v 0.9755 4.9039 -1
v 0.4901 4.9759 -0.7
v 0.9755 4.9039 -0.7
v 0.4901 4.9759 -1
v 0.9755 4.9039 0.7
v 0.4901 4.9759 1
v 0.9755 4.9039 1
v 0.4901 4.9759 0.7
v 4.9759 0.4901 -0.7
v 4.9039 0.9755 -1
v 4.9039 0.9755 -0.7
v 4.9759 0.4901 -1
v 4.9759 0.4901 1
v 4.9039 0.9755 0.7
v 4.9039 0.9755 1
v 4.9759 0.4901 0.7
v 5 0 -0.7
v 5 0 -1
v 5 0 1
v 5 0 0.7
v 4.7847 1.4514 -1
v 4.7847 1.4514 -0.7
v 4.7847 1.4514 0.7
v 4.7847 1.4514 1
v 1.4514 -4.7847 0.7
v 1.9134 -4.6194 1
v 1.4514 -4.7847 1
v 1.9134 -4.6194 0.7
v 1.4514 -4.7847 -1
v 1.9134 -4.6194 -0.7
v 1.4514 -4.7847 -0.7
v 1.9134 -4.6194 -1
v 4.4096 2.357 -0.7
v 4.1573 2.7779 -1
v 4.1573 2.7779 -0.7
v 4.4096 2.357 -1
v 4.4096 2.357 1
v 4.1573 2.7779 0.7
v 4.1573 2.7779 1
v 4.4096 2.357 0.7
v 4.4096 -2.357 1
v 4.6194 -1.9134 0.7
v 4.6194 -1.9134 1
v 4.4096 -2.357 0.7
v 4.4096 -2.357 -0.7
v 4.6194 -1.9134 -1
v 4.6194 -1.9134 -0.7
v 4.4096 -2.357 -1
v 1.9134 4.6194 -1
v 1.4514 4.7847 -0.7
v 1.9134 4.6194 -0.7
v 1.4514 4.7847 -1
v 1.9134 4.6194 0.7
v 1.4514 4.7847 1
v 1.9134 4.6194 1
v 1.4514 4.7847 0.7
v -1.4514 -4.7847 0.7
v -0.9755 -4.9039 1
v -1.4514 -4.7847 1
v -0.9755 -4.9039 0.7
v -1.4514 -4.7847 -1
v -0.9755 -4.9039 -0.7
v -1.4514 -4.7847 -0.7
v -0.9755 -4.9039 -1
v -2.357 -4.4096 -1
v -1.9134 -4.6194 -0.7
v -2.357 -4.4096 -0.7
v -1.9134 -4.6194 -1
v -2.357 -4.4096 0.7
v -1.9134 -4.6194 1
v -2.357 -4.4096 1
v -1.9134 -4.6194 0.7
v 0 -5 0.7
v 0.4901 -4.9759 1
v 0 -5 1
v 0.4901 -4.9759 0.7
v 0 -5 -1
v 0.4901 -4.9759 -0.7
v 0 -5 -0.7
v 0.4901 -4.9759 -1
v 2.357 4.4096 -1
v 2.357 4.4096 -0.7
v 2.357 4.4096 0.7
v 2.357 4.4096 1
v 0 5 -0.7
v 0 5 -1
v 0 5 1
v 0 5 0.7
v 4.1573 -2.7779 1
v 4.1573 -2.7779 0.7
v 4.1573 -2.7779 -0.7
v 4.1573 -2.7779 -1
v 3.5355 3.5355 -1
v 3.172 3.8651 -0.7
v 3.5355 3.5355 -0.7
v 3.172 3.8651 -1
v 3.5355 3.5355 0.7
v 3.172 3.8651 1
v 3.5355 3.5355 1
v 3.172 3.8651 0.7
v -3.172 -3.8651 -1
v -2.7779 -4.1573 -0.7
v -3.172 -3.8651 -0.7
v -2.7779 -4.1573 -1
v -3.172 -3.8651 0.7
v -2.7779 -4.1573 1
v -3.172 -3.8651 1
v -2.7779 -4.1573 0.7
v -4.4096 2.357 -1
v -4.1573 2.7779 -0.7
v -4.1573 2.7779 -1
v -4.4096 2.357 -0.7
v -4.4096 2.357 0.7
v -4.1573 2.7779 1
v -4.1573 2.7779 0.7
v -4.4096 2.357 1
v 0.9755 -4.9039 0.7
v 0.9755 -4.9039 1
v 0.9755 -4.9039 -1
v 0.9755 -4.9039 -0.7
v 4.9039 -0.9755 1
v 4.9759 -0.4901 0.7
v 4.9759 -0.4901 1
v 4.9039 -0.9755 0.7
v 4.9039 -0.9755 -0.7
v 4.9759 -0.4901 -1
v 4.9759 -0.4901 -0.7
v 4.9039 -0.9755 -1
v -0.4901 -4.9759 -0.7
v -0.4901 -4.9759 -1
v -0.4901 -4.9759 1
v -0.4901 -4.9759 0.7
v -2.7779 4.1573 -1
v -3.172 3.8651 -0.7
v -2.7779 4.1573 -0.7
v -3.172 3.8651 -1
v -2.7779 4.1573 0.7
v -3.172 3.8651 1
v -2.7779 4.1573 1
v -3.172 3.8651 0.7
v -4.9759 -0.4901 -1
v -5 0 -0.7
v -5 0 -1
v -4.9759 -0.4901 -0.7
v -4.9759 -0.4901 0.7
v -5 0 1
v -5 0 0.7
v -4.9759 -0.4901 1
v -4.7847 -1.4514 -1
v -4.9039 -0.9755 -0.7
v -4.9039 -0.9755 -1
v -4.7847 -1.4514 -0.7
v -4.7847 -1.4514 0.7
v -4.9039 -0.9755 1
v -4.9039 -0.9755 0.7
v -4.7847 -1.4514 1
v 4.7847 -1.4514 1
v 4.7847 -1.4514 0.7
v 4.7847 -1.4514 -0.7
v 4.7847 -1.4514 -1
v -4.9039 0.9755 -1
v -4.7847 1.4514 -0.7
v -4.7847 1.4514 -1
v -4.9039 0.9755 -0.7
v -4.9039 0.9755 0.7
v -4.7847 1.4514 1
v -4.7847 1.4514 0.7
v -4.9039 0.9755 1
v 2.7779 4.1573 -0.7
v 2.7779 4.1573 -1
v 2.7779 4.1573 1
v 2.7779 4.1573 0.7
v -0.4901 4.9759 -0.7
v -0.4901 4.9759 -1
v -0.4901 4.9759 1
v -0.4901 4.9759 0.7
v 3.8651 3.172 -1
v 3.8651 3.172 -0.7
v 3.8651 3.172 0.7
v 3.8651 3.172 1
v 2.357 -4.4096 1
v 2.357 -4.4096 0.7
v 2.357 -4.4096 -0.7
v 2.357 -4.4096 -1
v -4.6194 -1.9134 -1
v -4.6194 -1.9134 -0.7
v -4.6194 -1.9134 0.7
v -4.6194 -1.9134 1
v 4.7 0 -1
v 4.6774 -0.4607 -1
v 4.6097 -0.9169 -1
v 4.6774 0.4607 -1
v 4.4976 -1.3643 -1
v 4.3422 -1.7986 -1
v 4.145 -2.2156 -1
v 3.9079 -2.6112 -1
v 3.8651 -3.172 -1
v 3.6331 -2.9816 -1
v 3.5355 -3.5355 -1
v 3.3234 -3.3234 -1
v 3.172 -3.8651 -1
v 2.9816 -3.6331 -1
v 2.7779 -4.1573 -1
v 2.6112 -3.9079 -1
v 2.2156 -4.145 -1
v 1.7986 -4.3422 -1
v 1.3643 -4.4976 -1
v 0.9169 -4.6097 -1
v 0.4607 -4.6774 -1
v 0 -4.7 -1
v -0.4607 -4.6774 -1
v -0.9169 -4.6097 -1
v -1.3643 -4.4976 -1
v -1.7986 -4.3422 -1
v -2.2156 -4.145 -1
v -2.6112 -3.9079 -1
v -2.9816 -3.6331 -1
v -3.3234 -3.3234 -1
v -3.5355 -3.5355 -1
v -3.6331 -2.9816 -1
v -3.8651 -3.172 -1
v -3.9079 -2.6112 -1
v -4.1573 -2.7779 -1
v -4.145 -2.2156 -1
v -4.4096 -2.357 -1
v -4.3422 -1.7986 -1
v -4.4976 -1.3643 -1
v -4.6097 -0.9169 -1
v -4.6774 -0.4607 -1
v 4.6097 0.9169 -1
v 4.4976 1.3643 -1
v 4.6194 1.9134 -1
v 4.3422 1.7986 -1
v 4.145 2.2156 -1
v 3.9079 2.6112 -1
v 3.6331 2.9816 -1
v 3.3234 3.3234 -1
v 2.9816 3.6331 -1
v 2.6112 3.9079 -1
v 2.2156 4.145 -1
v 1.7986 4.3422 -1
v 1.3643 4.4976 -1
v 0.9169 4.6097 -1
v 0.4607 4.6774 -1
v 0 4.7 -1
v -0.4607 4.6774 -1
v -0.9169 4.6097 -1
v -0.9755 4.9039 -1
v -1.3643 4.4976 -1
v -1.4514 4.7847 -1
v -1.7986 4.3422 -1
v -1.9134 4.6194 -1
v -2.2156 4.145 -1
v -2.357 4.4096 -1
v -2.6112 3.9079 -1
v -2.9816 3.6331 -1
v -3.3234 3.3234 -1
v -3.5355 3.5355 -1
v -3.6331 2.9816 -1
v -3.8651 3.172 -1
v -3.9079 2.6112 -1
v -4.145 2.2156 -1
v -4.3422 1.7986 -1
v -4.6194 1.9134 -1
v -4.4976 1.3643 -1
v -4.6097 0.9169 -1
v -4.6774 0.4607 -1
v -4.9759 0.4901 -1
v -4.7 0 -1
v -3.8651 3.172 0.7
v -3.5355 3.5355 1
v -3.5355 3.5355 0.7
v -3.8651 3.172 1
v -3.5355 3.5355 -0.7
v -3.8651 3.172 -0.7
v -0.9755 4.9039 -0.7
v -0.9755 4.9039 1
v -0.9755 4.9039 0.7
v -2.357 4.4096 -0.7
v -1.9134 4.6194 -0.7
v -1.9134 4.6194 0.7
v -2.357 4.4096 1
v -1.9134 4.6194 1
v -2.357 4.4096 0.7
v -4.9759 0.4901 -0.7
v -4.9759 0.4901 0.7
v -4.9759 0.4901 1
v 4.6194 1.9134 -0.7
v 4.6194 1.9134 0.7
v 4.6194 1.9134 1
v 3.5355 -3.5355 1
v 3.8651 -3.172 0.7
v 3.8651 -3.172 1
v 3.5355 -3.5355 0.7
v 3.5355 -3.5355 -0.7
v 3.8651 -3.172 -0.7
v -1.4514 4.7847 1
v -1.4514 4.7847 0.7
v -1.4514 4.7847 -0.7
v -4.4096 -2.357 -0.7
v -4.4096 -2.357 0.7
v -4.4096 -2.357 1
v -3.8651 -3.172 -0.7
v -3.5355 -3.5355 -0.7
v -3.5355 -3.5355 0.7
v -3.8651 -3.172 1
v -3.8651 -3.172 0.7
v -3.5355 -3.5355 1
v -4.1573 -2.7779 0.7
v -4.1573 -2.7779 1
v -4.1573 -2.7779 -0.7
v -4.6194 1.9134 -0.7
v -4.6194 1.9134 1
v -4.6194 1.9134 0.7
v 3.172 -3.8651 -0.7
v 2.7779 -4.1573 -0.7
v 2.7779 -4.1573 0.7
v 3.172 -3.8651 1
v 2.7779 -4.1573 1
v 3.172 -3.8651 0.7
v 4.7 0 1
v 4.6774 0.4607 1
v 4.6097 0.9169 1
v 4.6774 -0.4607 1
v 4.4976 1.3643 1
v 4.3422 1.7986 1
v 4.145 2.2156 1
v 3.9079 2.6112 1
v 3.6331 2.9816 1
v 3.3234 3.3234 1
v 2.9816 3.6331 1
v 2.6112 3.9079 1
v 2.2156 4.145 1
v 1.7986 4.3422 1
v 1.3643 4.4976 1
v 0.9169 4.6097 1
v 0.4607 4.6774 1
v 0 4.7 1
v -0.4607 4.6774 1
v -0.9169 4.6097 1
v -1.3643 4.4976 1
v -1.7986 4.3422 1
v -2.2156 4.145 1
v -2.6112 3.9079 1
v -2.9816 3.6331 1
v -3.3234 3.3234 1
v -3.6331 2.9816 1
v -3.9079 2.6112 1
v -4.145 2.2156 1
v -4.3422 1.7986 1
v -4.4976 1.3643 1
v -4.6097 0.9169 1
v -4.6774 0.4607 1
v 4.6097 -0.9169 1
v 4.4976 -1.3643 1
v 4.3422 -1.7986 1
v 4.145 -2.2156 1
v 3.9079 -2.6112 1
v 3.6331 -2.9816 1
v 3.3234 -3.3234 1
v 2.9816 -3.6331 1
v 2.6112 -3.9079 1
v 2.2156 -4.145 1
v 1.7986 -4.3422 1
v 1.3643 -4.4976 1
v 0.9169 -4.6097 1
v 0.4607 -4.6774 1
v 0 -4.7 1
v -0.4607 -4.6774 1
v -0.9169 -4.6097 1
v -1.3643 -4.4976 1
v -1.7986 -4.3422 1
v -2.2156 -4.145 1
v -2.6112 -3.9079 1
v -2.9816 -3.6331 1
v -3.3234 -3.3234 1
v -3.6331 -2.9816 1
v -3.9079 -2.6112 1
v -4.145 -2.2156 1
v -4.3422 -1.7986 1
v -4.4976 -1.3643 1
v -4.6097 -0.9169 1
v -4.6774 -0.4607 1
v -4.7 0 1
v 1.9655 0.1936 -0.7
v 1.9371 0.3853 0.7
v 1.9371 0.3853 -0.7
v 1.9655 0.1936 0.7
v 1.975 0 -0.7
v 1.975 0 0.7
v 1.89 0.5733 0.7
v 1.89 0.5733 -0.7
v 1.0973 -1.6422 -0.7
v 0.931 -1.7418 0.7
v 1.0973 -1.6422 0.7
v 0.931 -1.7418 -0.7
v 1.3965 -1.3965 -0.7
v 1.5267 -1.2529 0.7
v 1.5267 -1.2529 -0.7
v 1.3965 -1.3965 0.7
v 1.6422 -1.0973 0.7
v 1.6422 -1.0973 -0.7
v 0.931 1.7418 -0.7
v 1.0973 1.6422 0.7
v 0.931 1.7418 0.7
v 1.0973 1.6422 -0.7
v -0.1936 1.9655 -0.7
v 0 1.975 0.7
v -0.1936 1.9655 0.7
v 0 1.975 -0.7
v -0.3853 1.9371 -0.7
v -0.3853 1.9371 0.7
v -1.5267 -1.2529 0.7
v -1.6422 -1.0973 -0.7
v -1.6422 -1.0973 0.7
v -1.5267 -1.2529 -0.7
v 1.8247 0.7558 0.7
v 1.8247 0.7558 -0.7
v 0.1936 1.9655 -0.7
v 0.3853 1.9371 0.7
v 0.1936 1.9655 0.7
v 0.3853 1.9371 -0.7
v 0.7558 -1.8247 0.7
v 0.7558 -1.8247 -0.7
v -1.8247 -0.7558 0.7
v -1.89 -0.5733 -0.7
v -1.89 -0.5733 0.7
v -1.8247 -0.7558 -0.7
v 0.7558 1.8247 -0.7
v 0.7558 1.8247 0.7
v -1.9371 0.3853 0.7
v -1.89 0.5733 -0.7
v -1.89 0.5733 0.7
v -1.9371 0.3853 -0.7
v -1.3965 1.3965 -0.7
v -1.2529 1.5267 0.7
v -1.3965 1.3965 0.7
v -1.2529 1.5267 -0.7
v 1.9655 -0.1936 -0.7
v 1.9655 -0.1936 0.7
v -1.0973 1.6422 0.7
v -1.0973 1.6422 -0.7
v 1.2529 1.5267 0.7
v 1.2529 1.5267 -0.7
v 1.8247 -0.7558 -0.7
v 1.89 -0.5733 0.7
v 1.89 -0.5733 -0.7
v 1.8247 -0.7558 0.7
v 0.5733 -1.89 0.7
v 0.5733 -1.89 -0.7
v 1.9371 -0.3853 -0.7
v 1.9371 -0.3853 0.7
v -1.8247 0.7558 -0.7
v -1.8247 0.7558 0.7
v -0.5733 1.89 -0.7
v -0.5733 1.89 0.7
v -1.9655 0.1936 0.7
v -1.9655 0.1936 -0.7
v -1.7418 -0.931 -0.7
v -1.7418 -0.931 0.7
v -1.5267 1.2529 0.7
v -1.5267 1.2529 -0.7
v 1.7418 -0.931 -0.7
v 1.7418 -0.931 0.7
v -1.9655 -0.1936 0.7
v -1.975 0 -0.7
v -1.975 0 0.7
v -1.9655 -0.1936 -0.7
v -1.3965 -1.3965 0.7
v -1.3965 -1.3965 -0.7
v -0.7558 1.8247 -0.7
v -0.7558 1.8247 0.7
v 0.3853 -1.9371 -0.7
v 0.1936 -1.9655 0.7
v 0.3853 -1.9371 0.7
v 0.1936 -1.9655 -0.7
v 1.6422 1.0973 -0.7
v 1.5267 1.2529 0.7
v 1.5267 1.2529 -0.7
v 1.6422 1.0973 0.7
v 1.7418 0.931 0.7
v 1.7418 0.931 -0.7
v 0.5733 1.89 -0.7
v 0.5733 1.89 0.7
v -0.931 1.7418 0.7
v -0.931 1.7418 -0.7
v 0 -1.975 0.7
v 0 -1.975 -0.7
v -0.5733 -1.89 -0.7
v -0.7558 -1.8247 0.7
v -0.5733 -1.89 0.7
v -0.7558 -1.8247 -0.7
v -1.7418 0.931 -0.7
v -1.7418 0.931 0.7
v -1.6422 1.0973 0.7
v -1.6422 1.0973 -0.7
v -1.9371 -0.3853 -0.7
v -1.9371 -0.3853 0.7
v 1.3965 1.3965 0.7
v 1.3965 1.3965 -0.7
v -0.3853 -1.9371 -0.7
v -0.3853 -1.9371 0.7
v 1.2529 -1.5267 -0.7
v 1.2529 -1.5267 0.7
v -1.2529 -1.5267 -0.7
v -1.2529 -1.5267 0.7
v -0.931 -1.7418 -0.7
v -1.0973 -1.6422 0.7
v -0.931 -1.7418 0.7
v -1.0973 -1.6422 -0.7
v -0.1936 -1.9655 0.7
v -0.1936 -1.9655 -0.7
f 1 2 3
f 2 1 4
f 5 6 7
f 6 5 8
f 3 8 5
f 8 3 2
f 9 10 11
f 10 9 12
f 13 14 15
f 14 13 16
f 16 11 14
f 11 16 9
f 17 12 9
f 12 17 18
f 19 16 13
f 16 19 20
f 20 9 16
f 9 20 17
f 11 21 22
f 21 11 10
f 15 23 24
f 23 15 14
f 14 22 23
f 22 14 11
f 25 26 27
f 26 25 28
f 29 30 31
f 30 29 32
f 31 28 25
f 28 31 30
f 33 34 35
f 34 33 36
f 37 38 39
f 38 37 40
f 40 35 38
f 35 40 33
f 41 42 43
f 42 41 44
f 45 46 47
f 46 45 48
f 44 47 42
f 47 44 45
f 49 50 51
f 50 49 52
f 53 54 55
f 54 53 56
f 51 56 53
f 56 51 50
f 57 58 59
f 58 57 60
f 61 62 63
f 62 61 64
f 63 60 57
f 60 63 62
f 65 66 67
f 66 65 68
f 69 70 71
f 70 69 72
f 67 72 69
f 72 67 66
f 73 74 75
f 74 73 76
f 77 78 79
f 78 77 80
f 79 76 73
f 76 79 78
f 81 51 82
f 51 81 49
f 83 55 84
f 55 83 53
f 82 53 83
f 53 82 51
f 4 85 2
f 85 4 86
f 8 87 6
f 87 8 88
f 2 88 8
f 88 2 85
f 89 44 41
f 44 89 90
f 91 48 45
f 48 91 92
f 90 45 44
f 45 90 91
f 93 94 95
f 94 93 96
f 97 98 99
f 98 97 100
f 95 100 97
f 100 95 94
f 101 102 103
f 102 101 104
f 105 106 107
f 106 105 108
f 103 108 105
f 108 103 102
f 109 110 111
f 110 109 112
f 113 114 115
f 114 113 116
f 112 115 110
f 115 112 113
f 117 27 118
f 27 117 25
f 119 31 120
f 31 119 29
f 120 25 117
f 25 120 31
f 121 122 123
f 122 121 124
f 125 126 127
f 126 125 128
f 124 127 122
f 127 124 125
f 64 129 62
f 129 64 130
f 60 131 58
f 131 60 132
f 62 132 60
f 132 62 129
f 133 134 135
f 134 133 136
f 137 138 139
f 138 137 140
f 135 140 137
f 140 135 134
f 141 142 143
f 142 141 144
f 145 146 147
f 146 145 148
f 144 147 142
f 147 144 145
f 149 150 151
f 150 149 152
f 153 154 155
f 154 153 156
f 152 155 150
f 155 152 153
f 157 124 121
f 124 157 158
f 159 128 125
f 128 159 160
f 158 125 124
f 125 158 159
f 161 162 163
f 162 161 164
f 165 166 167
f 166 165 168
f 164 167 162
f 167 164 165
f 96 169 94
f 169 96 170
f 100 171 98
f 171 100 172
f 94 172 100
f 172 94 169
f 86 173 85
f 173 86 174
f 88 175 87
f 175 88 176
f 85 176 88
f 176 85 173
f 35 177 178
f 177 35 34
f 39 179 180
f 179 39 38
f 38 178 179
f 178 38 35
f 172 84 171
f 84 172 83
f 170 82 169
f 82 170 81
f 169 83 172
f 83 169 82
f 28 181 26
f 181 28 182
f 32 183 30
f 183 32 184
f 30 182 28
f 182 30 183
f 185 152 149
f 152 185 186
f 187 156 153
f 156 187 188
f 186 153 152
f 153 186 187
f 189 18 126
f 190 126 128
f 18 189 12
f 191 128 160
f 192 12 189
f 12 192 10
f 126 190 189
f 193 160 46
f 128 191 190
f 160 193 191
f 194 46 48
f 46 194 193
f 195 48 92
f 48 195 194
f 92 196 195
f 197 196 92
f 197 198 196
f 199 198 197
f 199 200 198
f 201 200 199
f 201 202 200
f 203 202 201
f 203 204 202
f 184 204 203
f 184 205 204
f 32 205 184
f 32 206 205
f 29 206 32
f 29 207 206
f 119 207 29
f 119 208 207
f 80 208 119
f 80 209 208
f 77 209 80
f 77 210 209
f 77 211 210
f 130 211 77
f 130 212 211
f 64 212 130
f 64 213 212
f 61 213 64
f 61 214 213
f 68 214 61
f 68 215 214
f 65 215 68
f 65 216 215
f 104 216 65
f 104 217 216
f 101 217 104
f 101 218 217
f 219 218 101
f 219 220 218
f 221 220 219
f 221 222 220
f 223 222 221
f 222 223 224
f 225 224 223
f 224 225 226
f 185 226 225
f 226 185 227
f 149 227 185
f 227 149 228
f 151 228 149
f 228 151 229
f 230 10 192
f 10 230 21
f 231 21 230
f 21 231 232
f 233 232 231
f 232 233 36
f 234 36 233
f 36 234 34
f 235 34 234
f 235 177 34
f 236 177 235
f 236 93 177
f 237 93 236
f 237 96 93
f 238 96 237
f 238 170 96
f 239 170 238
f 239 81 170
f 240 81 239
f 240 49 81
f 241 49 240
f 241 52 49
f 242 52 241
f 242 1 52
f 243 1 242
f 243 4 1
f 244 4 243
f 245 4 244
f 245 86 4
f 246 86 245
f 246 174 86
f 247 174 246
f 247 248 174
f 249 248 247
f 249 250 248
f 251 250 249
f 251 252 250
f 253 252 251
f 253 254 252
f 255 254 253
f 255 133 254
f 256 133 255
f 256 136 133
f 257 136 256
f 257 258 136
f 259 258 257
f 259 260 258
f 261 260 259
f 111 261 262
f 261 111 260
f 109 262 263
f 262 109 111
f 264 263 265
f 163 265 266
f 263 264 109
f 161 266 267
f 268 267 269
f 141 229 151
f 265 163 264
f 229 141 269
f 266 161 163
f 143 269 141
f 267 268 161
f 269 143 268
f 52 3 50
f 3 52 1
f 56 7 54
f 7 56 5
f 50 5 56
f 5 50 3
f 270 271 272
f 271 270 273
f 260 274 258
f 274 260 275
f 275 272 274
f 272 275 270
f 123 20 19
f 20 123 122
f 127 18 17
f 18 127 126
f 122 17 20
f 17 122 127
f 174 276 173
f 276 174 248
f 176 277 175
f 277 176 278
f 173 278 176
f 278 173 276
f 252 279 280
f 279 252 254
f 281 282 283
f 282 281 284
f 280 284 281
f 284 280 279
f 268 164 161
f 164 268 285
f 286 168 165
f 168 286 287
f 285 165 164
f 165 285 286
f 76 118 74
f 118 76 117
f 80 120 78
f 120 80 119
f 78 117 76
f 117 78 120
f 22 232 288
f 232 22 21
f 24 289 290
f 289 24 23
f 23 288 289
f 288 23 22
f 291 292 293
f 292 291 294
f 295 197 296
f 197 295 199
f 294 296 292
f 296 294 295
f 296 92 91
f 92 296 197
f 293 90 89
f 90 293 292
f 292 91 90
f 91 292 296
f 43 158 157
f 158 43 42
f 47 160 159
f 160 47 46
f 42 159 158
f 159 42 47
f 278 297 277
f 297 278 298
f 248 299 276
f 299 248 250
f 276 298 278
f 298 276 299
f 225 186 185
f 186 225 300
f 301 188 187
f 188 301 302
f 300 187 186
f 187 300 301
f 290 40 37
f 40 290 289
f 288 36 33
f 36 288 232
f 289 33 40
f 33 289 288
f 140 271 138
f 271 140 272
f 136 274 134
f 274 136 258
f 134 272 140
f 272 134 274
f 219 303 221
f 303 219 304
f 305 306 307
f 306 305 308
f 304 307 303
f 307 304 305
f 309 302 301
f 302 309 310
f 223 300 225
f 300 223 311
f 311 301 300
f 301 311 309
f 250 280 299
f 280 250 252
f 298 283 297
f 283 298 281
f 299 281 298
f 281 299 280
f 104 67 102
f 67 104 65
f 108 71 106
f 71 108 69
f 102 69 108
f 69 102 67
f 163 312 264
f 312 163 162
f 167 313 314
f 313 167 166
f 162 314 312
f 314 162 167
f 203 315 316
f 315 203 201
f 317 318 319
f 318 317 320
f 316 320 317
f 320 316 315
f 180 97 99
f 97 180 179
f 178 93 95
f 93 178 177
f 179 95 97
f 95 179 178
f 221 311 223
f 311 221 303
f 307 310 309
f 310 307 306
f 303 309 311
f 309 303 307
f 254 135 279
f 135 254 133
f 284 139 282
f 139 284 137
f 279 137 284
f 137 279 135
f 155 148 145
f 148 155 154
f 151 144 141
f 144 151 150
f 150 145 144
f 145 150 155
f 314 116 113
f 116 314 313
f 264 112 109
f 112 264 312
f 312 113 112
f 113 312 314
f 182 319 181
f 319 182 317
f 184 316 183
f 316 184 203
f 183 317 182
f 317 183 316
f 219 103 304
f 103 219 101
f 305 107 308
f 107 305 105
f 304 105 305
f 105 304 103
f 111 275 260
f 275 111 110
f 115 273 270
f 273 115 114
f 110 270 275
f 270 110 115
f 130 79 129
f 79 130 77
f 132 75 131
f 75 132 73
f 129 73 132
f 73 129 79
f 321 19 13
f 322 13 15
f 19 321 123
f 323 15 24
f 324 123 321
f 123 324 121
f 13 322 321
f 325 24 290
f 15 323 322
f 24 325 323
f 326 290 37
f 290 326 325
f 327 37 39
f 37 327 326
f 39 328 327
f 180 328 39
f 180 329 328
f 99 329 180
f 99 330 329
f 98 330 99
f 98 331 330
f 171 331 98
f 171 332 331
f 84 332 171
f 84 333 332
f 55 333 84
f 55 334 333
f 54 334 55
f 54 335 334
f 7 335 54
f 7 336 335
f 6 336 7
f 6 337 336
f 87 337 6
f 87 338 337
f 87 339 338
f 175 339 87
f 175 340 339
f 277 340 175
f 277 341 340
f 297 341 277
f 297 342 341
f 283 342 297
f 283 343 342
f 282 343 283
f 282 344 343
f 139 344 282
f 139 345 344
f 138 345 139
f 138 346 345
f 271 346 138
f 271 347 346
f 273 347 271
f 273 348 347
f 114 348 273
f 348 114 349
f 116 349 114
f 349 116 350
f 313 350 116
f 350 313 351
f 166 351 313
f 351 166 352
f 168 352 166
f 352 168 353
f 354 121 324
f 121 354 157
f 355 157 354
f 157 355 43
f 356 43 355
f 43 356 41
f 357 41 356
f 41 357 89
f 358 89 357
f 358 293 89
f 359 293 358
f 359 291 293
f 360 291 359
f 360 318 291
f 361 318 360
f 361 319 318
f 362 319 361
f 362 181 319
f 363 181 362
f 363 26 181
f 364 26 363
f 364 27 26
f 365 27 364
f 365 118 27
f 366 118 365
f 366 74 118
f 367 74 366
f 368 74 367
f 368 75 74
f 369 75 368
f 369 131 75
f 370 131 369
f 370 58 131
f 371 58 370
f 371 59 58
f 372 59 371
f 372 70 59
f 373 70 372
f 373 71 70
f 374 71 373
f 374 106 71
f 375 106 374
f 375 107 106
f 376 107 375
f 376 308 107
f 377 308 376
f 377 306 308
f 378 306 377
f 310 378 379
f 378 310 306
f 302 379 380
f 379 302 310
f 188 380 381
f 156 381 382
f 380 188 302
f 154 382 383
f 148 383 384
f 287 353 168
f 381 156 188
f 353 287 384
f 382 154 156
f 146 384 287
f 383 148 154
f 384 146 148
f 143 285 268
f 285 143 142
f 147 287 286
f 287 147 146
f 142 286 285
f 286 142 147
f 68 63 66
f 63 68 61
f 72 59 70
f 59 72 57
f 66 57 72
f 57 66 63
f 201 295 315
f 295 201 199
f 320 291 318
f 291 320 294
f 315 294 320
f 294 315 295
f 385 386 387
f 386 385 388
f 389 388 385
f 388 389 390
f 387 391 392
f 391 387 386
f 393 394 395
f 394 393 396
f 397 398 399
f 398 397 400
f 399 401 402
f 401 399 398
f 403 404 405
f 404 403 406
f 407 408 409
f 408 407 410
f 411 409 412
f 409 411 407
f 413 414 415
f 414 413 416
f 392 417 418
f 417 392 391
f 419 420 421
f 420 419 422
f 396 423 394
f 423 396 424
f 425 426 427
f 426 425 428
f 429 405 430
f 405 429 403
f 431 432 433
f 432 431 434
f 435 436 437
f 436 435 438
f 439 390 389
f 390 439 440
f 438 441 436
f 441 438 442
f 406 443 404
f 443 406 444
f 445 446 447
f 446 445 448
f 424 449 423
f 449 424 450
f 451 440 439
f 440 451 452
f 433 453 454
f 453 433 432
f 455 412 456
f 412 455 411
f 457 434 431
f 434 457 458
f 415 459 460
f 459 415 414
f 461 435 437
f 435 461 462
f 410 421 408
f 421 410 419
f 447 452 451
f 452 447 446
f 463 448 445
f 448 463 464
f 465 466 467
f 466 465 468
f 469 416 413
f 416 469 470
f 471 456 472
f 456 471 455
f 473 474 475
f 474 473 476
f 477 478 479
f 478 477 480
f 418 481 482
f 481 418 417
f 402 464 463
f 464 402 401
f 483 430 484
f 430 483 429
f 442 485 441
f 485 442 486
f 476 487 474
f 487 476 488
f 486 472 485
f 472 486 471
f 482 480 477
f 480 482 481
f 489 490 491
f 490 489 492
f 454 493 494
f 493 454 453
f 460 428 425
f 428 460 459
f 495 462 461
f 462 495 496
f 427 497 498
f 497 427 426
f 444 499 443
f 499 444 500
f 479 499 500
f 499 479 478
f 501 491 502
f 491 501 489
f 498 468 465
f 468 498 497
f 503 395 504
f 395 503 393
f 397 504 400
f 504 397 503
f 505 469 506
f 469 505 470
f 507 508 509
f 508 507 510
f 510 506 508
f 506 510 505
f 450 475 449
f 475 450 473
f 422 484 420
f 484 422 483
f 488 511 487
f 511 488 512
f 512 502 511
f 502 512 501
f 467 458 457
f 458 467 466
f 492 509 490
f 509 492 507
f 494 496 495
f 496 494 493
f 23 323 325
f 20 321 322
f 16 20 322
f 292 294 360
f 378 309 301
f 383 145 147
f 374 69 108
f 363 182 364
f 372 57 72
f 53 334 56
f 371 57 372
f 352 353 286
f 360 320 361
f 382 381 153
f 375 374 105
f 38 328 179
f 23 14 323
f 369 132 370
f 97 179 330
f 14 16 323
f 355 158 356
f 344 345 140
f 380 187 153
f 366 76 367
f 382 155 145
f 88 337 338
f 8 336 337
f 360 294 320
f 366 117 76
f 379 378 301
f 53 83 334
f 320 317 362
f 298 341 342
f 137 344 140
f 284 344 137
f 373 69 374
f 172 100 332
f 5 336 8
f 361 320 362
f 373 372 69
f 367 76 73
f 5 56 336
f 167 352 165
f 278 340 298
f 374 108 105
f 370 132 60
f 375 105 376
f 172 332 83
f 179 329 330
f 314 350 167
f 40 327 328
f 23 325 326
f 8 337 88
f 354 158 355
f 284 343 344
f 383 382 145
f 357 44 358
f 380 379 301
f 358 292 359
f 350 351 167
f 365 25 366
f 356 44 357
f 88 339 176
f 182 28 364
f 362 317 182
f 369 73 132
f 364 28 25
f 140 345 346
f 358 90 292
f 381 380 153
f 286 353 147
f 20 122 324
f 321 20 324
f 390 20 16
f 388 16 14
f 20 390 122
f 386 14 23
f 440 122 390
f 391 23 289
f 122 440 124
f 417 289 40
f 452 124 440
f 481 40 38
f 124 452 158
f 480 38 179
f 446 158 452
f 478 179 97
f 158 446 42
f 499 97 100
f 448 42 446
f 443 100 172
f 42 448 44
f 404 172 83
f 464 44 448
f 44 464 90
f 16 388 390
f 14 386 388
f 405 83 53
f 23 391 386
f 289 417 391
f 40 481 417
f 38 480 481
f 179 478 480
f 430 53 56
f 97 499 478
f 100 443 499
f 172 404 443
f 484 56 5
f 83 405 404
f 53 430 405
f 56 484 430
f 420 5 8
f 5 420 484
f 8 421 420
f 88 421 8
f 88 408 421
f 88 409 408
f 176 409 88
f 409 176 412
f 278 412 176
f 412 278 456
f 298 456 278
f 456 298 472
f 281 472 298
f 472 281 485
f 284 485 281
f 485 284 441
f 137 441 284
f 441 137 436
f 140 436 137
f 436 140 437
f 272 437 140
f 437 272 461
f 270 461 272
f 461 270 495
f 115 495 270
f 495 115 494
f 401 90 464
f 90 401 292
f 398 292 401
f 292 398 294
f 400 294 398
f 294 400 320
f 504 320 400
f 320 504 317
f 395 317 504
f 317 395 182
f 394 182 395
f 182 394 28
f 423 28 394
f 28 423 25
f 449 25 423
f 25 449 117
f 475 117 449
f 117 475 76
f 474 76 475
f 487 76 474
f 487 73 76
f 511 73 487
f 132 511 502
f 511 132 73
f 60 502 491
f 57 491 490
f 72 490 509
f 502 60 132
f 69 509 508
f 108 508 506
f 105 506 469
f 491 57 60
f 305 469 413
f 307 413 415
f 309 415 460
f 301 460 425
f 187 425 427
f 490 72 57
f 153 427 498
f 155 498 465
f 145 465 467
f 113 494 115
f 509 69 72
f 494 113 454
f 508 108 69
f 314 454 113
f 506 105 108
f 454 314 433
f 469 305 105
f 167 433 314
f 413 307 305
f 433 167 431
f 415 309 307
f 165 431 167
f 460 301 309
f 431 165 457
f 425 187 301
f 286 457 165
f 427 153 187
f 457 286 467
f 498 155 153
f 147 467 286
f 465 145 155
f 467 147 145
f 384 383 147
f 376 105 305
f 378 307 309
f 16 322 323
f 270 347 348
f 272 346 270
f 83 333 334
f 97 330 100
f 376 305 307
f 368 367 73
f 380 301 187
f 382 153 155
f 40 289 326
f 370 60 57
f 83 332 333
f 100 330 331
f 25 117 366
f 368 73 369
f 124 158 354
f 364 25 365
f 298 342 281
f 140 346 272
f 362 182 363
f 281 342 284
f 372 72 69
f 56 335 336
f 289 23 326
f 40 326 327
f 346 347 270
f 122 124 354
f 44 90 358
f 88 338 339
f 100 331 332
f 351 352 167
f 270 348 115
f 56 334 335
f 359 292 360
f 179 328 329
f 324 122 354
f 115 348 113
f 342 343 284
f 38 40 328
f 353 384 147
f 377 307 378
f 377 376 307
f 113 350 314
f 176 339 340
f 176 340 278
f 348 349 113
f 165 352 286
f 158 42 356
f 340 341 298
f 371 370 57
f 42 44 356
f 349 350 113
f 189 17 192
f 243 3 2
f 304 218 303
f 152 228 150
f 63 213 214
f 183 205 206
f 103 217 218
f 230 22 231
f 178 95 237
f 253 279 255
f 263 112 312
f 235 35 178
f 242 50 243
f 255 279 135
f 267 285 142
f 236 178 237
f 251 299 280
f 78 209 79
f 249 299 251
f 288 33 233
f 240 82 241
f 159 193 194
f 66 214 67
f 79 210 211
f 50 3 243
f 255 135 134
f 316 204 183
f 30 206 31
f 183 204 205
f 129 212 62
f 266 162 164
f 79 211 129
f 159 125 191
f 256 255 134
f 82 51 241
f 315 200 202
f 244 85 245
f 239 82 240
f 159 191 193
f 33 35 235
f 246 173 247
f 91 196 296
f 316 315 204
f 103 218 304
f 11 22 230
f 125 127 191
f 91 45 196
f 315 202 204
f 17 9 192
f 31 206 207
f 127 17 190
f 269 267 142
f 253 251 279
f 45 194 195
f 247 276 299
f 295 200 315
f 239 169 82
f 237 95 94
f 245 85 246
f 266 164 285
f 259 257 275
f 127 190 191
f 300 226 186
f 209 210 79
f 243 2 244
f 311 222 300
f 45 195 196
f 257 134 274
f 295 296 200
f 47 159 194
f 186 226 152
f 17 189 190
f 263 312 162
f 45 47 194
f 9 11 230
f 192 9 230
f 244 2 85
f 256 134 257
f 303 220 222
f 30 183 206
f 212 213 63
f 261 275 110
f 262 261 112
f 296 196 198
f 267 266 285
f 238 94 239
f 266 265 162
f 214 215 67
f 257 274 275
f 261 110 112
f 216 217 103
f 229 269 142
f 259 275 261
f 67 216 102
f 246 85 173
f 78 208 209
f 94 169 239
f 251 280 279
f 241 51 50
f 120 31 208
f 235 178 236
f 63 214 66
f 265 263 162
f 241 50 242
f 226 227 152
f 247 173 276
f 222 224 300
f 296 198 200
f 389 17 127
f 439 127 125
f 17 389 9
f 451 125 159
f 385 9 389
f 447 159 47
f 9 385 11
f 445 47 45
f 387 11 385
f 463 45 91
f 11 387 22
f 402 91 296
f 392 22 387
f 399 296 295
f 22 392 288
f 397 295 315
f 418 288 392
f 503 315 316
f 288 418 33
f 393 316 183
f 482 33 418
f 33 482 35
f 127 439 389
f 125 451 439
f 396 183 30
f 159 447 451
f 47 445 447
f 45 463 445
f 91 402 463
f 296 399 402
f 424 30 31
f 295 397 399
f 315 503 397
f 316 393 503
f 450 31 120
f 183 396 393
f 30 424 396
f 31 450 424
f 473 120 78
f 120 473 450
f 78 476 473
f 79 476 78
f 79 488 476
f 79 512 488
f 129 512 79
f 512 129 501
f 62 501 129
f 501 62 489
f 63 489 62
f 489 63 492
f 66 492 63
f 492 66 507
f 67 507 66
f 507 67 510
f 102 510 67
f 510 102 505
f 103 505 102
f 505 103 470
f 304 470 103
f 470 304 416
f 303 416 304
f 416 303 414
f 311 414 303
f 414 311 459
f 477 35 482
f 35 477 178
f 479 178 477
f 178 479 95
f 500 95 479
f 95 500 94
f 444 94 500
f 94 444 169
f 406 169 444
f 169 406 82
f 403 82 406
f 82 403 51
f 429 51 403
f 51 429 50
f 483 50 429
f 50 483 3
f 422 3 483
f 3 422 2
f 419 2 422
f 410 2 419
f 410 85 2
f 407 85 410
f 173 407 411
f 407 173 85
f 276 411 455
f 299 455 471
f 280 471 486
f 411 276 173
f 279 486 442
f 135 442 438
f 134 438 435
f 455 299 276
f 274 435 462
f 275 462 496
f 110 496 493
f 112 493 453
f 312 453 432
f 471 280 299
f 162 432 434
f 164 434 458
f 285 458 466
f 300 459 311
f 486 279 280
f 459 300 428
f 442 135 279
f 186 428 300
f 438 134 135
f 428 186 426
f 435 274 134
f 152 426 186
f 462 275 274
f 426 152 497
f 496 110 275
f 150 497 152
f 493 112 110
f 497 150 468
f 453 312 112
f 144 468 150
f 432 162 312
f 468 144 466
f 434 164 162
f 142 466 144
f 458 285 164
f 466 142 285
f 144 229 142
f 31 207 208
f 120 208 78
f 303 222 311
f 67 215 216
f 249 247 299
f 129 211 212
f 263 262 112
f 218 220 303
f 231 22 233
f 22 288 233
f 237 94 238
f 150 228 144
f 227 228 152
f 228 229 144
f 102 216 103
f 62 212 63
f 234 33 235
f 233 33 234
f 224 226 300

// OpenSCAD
// Parameters
outer_diameter = 10; //[5:20:0.1]
inner_diameter = 4; //[2:8:0.1]
thickness = 2; //[1:6:0.1]
edge_radius = 0.2; //[0:1:0.05]
chamfer = 0.3; //[0:1:0.05]
hub_outer_diameter = 6; //[3:12:0.1]
hub_length = 3; //[1.5:8:0.1]
press_fit_clearance = -0.05; //[-0.2:0.2:0.01]
adhesive_gap = 0.1; //[0:0.5:0.01]
overlap = 0.8; //[0.2:2:0.1]
bore_extra_height = 2; //[1:6:0.5]

// Ring Magnet - complete geometry
module ring_magnet() {
  color([0.72, 0.45, 0.2]) { // Copper color for magnet
    difference() {
      // Outer ring
      translate([0, 0, 0])
        cylinder(r=outer_diameter/2, h=thickness, center=true, $fn=64);
      
      // Center bore
      translate([0, 0, 0])
        cylinder(r=(inner_diameter + press_fit_clearance)/2, h=thickness + hub_length + bore_extra_height, center=true, $fn=64);
      
      // Outer chamfer top
      translate([0, 0, thickness/2 - chamfer/2])
        cylinder(r1=outer_diameter/2, r2=outer_diameter/2 - chamfer, h=chamfer, center=true, $fn=64);
      
      // Outer chamfer bottom
      translate([0, 0, -thickness/2 + chamfer/2])
        cylinder(r1=outer_diameter/2 - chamfer, r2=outer_diameter/2, h=chamfer, center=true, $fn=64);
    }
  }
}

// Mounting Hub - complete geometry
module mounting_hub() {
  color([0.85, 0.85, 0.8]) { // Off-white for hub
    difference() {
      // Outer hub
      translate([0, 0, thickness/2 + hub_length/2 - overlap])
        cylinder(r=hub_outer_diameter/2, h=hub_length, center=true, $fn=64);
      
      // Hub magnet seat
      translate([0, 0, thickness/2 + hub_length/2 - overlap])
        cylinder(r=outer_diameter/2 + adhesive_gap, h=hub_length + bore_extra_height, center=true, $fn=64);
    }
  }
}

// Magnet Assembly
module magnet() {
  union() {
    ring_magnet();
    mounting_hub();
  }
}

// Final Assembly
module assembly() {
  magnet();
}

assembly();
